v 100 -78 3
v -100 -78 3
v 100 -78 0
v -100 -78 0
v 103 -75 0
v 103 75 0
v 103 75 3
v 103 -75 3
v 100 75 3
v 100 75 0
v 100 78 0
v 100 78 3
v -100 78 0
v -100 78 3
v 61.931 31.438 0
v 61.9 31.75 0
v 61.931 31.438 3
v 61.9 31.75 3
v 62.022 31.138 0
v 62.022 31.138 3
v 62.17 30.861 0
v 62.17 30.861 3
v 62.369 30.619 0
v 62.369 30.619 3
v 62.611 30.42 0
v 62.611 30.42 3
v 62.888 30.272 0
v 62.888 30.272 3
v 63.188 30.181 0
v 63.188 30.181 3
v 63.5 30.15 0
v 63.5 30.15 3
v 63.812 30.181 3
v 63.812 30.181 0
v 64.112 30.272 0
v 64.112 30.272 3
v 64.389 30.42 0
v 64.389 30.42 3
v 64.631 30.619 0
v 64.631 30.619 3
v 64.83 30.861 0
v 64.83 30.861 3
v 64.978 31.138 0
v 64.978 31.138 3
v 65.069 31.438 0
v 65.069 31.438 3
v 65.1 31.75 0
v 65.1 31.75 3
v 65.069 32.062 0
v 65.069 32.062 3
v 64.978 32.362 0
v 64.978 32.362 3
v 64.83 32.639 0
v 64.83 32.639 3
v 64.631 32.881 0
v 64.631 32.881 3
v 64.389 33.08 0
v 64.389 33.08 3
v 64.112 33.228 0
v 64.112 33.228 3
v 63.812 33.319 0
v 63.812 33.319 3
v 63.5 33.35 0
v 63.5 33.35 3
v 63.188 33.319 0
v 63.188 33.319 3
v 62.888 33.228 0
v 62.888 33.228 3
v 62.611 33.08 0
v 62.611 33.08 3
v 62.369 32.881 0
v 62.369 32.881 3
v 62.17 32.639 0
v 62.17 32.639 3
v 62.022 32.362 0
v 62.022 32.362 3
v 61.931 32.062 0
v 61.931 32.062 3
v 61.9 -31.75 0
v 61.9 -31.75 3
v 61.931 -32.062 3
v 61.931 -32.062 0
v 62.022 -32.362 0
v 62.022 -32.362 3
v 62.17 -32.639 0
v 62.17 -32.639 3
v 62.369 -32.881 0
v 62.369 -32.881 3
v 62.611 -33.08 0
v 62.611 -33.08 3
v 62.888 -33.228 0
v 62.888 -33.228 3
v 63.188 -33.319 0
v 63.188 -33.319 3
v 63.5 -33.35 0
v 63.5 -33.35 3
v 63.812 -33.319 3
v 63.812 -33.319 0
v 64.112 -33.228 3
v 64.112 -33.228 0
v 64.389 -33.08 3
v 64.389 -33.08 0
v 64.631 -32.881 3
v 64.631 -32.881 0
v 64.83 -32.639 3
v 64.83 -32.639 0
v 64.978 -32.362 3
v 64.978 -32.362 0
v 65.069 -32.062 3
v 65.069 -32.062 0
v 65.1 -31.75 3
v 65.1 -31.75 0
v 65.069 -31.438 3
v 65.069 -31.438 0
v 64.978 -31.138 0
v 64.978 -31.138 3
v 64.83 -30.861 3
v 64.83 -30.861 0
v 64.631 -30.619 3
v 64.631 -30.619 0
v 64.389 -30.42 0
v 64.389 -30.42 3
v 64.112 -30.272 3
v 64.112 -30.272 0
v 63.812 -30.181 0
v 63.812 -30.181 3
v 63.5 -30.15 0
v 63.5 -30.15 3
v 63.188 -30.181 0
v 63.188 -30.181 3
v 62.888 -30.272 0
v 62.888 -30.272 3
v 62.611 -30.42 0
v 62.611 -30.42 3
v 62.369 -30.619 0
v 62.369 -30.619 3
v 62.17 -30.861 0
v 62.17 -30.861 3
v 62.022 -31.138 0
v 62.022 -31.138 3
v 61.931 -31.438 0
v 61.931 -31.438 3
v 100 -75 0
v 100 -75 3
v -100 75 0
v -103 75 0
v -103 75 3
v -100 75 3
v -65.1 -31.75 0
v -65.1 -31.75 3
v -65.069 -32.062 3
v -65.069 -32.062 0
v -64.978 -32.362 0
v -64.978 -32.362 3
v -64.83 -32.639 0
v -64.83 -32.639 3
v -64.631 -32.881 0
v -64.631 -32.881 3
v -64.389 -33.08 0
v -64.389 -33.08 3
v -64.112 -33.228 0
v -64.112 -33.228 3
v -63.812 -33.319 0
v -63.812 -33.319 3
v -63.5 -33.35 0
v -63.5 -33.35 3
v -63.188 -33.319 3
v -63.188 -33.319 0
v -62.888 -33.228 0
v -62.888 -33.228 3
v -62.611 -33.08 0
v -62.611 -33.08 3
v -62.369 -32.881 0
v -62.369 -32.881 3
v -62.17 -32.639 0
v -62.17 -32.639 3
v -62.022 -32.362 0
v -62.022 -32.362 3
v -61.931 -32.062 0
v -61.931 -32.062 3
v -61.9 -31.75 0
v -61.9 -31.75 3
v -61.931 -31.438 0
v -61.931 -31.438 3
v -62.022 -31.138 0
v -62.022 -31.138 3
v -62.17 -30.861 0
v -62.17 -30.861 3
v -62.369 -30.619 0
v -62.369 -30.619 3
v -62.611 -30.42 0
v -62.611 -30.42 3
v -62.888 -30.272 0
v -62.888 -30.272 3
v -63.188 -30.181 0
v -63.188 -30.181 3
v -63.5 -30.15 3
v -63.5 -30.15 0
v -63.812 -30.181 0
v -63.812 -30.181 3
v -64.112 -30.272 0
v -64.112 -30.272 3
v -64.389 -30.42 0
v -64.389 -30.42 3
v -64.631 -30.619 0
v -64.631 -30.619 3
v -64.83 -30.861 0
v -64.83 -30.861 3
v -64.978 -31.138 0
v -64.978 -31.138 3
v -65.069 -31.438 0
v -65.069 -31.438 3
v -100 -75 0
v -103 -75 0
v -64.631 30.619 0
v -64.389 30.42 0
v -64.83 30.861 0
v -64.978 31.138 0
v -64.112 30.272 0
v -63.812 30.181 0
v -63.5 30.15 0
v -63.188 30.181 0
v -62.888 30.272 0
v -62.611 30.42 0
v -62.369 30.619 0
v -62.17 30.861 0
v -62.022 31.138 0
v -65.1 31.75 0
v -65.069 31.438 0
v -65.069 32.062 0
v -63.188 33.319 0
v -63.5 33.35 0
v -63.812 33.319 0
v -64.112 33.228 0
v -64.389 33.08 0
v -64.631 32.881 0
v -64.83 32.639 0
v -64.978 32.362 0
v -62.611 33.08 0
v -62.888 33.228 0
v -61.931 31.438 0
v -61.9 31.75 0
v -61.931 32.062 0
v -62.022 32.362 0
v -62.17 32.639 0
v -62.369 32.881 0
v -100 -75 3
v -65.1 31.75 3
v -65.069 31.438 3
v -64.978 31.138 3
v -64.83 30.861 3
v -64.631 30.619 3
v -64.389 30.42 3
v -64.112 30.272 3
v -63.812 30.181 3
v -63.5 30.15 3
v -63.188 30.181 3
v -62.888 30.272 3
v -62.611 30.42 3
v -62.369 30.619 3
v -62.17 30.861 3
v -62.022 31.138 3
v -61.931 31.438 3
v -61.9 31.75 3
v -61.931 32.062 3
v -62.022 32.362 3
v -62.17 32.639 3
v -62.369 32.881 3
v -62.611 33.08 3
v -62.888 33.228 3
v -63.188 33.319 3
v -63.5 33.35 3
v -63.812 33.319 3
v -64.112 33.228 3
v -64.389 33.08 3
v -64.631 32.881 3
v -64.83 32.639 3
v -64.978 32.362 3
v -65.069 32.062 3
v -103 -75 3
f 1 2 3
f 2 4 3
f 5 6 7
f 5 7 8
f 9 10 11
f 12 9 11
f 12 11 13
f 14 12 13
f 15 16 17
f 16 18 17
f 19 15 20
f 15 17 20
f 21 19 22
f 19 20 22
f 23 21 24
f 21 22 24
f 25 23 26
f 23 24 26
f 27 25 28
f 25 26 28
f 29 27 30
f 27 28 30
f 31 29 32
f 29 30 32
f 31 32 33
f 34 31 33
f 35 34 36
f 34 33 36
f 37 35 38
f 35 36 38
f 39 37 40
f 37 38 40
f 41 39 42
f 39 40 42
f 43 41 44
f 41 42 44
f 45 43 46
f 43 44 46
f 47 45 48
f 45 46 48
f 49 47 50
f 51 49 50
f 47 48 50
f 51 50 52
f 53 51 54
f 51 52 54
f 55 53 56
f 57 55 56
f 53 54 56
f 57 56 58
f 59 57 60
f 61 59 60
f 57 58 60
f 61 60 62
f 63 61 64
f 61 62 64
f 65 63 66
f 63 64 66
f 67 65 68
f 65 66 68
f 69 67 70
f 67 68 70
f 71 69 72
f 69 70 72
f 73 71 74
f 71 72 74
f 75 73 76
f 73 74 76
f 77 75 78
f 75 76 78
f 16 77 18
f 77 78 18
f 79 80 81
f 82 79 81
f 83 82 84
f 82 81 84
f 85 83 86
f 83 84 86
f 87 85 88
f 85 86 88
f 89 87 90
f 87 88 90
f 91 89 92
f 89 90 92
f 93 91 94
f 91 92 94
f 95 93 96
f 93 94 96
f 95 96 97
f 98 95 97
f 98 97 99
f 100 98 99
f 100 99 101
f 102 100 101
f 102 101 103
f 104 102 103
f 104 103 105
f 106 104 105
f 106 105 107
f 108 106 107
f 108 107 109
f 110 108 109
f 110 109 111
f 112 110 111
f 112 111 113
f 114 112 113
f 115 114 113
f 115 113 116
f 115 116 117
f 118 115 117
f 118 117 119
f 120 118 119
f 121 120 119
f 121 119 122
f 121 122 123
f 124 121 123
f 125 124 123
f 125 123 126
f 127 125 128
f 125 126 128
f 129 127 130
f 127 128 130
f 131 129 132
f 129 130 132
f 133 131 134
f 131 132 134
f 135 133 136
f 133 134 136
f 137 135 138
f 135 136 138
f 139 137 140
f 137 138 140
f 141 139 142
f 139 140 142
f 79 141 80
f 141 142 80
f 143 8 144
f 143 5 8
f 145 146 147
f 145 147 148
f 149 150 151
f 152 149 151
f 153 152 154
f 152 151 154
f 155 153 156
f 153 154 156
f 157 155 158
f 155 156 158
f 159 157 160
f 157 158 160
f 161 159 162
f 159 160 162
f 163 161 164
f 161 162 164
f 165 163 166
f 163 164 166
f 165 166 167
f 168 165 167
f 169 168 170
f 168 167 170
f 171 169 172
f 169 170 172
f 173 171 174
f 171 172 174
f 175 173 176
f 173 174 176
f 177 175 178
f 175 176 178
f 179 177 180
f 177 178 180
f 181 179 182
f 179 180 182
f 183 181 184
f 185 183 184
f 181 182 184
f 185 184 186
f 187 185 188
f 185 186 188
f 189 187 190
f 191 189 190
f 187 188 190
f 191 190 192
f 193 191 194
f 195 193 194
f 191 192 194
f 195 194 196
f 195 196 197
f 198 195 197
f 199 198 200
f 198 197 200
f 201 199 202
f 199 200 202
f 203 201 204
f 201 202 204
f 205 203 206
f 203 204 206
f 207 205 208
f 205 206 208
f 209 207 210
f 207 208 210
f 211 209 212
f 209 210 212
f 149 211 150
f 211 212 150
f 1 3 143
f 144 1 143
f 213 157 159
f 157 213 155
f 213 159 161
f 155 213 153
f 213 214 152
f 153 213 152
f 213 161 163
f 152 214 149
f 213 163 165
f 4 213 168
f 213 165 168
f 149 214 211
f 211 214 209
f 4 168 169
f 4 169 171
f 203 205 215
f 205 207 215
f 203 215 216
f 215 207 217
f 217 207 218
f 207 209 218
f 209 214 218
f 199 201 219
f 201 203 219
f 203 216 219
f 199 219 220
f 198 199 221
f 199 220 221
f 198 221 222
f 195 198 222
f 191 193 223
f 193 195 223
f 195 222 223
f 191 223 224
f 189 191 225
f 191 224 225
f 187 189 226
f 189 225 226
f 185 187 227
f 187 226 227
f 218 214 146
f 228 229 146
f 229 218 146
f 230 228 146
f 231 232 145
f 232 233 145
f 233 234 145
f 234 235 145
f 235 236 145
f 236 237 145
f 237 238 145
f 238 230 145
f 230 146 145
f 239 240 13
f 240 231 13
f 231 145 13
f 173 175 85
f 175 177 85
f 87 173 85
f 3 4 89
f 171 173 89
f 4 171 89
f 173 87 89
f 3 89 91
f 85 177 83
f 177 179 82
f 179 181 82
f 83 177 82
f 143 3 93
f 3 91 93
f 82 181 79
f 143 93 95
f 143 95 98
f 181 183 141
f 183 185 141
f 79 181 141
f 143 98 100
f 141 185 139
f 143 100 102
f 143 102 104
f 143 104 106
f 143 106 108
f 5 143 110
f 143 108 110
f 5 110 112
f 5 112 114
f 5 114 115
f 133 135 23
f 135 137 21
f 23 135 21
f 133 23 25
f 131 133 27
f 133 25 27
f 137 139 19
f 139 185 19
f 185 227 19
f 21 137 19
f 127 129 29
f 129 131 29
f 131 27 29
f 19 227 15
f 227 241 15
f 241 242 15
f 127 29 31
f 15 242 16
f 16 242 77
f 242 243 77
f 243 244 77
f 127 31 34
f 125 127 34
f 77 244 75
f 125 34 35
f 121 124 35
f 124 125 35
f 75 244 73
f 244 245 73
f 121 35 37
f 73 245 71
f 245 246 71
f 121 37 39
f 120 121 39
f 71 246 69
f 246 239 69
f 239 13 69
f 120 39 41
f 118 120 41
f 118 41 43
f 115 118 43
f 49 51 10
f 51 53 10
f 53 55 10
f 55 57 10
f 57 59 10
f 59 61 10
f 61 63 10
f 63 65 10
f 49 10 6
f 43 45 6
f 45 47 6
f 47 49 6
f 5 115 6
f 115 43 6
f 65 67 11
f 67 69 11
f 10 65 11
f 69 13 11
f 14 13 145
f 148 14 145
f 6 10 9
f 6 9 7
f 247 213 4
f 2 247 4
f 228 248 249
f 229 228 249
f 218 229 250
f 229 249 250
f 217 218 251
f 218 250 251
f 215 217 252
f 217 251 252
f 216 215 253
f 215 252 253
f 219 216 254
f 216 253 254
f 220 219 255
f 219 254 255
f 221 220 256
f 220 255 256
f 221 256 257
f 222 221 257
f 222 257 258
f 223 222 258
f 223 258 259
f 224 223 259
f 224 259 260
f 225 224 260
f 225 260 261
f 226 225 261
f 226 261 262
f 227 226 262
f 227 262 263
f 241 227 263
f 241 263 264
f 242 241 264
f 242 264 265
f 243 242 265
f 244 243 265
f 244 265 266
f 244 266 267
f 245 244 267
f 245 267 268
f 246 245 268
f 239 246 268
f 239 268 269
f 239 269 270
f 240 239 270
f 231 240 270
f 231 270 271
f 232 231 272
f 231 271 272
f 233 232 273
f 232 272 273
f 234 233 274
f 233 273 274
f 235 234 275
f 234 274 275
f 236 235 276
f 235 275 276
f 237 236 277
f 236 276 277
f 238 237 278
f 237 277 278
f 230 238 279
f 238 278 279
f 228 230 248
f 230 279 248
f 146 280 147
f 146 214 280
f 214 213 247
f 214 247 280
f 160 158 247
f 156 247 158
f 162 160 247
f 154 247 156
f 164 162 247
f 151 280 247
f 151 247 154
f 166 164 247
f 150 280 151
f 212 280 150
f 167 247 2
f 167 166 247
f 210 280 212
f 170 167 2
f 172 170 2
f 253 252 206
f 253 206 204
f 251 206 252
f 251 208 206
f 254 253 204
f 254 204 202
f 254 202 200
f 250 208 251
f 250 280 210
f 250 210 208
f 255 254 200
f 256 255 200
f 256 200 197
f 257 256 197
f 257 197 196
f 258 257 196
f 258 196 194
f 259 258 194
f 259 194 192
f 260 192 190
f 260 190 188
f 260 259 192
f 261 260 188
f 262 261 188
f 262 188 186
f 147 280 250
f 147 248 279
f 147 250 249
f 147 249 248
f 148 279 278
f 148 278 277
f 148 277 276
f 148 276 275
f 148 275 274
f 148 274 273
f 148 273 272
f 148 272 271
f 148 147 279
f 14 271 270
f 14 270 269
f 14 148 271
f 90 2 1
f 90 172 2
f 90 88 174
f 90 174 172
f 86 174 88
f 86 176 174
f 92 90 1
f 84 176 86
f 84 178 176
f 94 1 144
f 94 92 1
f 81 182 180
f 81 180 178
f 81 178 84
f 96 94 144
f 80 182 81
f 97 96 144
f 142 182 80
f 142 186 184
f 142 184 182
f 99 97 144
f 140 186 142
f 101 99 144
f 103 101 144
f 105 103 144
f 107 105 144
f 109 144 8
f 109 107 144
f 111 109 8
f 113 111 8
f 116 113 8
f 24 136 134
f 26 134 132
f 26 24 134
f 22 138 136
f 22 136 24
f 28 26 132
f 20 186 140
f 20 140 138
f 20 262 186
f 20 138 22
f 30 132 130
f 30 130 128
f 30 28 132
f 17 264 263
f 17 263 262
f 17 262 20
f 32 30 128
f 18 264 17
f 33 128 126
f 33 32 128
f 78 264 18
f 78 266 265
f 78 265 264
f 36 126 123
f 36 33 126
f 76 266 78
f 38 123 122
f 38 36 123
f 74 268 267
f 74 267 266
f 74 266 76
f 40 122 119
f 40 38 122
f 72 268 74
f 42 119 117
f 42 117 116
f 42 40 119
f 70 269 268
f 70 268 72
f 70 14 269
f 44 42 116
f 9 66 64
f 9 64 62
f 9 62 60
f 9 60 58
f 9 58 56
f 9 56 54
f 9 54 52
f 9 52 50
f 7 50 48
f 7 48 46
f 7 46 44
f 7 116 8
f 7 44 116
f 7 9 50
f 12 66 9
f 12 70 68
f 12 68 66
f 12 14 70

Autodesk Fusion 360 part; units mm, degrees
sketch "Esquisse1" plane through (0, 0, 0) normal (0, 0, 1) x (1, 0, 0)
  line L0 (100, 78) -> (-100, 78)
  line L1 (-100, 78) -> (-100, -78)
  line L2 (-100, -78) -> (100, -78)
  line L3 (100, -78) -> (100, 78)
  line L4 (100, 78) -> (-100, -78) construction
  line L5 (-100, 78) -> (100, -78) construction
  line L6 (103, -75) -> (-103, -75)
  line L7 (-103, -75) -> (-103, 75)
  line L8 (-103, 75) -> (103, 75)
  line L9 (103, 75) -> (103, -75)
  line L10 (103, -75) -> (-103, 75) construction
  line L11 (-103, -75) -> (103, 75) construction
  dimension "d1" = 200
  dimension "d2" = 206
  dimension "d3" = 150
  dimension "d4" = 156
extrude "Extrusion1" add sketch "Esquisse1" along normal blind 3
sketch "Esquisse3" plane through (0, 0, 3) normal (0, 0, 1) x (-1, 0, 0)
  line L0 (-100, -75) -> (-100, -78)
  line L1 (-100, -78) -> (100, -78)
  line L2 (100, -78) -> (100, -75)
  line L3 (100, -75) -> (103, -75)
  line L4 (103, -75) -> (103, 75)
  line L5 (103, 75) -> (100, 75)
  line L6 (100, 75) -> (100, 78)
  line L7 (100, 78) -> (-100, 78)
  line L8 (-100, 78) -> (-100, 75)
  line L9 (-100, 75) -> (-103, 75)
  line L10 (-103, 75) -> (-103, -75)
  line L11 (-103, -75) -> (-100, -75)
  line L12 (-63.5, 31.75) -> (63.5, 31.75)
  line L13 (63.5, 31.75) -> (63.5, -31.75)
  line L14 (63.5, -31.75) -> (-63.5, -31.75)
  line L15 (-63.5, -31.75) -> (-63.5, 31.75)
  line L16 (-63.5, 31.75) -> (63.5, -31.75) construction
  line L17 (63.5, 31.75) -> (-63.5, -31.75) construction
  circle A0 centre (63.5, -31.75) radius 1.6
  circle A1 centre (63.5, 31.75) radius 1.6
  circle A2 centre (-63.5, -31.75) radius 1.6
  circle A3 centre (-63.5, 31.75) radius 1.6
  dimension "d18" = 63.5
  dimension "d19" = 127
  dimension "d20" = 3.2
  dimension "d21" = 3.2
  dimension "d22" = 3.2
  dimension "d23" = 3.2
extrude "Extrusion3" cut sketch "Esquisse3" against normal blind 3 contours L12 L15 A3 | L12 L15 A3 | L12 L13 A1 | L12 L13 A1 | L14 L15 A2 | L14 L15 A2 | L13 L14 A0 | L13 L14 A0
equation "d2 = d1 + ( 2 * 3 ) * 1 mm"
equation "d4 = d3 + ( 2 * 3 ) * 1 mm"
